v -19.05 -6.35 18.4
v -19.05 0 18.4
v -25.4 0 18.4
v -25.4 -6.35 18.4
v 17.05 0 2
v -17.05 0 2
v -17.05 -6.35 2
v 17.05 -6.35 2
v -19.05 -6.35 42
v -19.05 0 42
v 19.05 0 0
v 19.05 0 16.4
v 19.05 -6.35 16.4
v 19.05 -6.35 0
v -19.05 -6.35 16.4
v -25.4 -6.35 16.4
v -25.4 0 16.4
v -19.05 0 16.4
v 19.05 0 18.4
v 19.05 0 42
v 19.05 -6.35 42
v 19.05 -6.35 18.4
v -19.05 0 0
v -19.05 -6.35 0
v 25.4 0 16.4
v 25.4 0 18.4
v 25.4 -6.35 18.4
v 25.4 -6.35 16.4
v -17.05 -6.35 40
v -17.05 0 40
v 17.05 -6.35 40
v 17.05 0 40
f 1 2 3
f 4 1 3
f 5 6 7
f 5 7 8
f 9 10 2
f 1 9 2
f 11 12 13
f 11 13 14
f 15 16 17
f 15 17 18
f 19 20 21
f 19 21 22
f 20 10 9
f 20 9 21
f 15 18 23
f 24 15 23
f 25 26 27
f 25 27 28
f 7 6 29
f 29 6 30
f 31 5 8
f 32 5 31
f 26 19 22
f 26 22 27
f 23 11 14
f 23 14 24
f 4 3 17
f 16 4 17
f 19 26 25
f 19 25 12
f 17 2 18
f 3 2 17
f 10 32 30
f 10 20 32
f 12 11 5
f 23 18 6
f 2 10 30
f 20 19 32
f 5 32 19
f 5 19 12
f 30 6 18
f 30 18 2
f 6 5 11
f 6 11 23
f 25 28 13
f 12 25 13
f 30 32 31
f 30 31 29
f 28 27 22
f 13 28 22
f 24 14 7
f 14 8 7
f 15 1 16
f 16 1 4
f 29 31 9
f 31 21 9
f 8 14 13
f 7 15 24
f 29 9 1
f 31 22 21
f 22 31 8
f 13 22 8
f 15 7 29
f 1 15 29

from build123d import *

# Parameters (mm, degrees)
F1_DEPTH = 6.35


# Not quite as in the source:
# - a length typed as a fraction of an inch, garbled in the dataset ("3 / 203.2 mm" for 3/8 in), is restored


with BuildPart() as f1:
    # F0 (on Front) → F1 (new body)
    with BuildSketch(Plane.XZ):
        Polygon((-25.4000015863, 18.4), (-25.4, 16.4), (-19.05, 16.4), (-19.05, 0), (0, 0), (0, 2), (-17.05, 2), (-17.05, 40), (0, 40), (0, 42), (-19.05, 42), (-19.05, 18.4), align=None)
    extrude(amount=F1_DEPTH)

    # F2: F1 across plane


with BuildPart() as f1_1:
    add(f1.part)
    add(f1.part.mirror(Plane.YZ))


solid = f1_1.part
